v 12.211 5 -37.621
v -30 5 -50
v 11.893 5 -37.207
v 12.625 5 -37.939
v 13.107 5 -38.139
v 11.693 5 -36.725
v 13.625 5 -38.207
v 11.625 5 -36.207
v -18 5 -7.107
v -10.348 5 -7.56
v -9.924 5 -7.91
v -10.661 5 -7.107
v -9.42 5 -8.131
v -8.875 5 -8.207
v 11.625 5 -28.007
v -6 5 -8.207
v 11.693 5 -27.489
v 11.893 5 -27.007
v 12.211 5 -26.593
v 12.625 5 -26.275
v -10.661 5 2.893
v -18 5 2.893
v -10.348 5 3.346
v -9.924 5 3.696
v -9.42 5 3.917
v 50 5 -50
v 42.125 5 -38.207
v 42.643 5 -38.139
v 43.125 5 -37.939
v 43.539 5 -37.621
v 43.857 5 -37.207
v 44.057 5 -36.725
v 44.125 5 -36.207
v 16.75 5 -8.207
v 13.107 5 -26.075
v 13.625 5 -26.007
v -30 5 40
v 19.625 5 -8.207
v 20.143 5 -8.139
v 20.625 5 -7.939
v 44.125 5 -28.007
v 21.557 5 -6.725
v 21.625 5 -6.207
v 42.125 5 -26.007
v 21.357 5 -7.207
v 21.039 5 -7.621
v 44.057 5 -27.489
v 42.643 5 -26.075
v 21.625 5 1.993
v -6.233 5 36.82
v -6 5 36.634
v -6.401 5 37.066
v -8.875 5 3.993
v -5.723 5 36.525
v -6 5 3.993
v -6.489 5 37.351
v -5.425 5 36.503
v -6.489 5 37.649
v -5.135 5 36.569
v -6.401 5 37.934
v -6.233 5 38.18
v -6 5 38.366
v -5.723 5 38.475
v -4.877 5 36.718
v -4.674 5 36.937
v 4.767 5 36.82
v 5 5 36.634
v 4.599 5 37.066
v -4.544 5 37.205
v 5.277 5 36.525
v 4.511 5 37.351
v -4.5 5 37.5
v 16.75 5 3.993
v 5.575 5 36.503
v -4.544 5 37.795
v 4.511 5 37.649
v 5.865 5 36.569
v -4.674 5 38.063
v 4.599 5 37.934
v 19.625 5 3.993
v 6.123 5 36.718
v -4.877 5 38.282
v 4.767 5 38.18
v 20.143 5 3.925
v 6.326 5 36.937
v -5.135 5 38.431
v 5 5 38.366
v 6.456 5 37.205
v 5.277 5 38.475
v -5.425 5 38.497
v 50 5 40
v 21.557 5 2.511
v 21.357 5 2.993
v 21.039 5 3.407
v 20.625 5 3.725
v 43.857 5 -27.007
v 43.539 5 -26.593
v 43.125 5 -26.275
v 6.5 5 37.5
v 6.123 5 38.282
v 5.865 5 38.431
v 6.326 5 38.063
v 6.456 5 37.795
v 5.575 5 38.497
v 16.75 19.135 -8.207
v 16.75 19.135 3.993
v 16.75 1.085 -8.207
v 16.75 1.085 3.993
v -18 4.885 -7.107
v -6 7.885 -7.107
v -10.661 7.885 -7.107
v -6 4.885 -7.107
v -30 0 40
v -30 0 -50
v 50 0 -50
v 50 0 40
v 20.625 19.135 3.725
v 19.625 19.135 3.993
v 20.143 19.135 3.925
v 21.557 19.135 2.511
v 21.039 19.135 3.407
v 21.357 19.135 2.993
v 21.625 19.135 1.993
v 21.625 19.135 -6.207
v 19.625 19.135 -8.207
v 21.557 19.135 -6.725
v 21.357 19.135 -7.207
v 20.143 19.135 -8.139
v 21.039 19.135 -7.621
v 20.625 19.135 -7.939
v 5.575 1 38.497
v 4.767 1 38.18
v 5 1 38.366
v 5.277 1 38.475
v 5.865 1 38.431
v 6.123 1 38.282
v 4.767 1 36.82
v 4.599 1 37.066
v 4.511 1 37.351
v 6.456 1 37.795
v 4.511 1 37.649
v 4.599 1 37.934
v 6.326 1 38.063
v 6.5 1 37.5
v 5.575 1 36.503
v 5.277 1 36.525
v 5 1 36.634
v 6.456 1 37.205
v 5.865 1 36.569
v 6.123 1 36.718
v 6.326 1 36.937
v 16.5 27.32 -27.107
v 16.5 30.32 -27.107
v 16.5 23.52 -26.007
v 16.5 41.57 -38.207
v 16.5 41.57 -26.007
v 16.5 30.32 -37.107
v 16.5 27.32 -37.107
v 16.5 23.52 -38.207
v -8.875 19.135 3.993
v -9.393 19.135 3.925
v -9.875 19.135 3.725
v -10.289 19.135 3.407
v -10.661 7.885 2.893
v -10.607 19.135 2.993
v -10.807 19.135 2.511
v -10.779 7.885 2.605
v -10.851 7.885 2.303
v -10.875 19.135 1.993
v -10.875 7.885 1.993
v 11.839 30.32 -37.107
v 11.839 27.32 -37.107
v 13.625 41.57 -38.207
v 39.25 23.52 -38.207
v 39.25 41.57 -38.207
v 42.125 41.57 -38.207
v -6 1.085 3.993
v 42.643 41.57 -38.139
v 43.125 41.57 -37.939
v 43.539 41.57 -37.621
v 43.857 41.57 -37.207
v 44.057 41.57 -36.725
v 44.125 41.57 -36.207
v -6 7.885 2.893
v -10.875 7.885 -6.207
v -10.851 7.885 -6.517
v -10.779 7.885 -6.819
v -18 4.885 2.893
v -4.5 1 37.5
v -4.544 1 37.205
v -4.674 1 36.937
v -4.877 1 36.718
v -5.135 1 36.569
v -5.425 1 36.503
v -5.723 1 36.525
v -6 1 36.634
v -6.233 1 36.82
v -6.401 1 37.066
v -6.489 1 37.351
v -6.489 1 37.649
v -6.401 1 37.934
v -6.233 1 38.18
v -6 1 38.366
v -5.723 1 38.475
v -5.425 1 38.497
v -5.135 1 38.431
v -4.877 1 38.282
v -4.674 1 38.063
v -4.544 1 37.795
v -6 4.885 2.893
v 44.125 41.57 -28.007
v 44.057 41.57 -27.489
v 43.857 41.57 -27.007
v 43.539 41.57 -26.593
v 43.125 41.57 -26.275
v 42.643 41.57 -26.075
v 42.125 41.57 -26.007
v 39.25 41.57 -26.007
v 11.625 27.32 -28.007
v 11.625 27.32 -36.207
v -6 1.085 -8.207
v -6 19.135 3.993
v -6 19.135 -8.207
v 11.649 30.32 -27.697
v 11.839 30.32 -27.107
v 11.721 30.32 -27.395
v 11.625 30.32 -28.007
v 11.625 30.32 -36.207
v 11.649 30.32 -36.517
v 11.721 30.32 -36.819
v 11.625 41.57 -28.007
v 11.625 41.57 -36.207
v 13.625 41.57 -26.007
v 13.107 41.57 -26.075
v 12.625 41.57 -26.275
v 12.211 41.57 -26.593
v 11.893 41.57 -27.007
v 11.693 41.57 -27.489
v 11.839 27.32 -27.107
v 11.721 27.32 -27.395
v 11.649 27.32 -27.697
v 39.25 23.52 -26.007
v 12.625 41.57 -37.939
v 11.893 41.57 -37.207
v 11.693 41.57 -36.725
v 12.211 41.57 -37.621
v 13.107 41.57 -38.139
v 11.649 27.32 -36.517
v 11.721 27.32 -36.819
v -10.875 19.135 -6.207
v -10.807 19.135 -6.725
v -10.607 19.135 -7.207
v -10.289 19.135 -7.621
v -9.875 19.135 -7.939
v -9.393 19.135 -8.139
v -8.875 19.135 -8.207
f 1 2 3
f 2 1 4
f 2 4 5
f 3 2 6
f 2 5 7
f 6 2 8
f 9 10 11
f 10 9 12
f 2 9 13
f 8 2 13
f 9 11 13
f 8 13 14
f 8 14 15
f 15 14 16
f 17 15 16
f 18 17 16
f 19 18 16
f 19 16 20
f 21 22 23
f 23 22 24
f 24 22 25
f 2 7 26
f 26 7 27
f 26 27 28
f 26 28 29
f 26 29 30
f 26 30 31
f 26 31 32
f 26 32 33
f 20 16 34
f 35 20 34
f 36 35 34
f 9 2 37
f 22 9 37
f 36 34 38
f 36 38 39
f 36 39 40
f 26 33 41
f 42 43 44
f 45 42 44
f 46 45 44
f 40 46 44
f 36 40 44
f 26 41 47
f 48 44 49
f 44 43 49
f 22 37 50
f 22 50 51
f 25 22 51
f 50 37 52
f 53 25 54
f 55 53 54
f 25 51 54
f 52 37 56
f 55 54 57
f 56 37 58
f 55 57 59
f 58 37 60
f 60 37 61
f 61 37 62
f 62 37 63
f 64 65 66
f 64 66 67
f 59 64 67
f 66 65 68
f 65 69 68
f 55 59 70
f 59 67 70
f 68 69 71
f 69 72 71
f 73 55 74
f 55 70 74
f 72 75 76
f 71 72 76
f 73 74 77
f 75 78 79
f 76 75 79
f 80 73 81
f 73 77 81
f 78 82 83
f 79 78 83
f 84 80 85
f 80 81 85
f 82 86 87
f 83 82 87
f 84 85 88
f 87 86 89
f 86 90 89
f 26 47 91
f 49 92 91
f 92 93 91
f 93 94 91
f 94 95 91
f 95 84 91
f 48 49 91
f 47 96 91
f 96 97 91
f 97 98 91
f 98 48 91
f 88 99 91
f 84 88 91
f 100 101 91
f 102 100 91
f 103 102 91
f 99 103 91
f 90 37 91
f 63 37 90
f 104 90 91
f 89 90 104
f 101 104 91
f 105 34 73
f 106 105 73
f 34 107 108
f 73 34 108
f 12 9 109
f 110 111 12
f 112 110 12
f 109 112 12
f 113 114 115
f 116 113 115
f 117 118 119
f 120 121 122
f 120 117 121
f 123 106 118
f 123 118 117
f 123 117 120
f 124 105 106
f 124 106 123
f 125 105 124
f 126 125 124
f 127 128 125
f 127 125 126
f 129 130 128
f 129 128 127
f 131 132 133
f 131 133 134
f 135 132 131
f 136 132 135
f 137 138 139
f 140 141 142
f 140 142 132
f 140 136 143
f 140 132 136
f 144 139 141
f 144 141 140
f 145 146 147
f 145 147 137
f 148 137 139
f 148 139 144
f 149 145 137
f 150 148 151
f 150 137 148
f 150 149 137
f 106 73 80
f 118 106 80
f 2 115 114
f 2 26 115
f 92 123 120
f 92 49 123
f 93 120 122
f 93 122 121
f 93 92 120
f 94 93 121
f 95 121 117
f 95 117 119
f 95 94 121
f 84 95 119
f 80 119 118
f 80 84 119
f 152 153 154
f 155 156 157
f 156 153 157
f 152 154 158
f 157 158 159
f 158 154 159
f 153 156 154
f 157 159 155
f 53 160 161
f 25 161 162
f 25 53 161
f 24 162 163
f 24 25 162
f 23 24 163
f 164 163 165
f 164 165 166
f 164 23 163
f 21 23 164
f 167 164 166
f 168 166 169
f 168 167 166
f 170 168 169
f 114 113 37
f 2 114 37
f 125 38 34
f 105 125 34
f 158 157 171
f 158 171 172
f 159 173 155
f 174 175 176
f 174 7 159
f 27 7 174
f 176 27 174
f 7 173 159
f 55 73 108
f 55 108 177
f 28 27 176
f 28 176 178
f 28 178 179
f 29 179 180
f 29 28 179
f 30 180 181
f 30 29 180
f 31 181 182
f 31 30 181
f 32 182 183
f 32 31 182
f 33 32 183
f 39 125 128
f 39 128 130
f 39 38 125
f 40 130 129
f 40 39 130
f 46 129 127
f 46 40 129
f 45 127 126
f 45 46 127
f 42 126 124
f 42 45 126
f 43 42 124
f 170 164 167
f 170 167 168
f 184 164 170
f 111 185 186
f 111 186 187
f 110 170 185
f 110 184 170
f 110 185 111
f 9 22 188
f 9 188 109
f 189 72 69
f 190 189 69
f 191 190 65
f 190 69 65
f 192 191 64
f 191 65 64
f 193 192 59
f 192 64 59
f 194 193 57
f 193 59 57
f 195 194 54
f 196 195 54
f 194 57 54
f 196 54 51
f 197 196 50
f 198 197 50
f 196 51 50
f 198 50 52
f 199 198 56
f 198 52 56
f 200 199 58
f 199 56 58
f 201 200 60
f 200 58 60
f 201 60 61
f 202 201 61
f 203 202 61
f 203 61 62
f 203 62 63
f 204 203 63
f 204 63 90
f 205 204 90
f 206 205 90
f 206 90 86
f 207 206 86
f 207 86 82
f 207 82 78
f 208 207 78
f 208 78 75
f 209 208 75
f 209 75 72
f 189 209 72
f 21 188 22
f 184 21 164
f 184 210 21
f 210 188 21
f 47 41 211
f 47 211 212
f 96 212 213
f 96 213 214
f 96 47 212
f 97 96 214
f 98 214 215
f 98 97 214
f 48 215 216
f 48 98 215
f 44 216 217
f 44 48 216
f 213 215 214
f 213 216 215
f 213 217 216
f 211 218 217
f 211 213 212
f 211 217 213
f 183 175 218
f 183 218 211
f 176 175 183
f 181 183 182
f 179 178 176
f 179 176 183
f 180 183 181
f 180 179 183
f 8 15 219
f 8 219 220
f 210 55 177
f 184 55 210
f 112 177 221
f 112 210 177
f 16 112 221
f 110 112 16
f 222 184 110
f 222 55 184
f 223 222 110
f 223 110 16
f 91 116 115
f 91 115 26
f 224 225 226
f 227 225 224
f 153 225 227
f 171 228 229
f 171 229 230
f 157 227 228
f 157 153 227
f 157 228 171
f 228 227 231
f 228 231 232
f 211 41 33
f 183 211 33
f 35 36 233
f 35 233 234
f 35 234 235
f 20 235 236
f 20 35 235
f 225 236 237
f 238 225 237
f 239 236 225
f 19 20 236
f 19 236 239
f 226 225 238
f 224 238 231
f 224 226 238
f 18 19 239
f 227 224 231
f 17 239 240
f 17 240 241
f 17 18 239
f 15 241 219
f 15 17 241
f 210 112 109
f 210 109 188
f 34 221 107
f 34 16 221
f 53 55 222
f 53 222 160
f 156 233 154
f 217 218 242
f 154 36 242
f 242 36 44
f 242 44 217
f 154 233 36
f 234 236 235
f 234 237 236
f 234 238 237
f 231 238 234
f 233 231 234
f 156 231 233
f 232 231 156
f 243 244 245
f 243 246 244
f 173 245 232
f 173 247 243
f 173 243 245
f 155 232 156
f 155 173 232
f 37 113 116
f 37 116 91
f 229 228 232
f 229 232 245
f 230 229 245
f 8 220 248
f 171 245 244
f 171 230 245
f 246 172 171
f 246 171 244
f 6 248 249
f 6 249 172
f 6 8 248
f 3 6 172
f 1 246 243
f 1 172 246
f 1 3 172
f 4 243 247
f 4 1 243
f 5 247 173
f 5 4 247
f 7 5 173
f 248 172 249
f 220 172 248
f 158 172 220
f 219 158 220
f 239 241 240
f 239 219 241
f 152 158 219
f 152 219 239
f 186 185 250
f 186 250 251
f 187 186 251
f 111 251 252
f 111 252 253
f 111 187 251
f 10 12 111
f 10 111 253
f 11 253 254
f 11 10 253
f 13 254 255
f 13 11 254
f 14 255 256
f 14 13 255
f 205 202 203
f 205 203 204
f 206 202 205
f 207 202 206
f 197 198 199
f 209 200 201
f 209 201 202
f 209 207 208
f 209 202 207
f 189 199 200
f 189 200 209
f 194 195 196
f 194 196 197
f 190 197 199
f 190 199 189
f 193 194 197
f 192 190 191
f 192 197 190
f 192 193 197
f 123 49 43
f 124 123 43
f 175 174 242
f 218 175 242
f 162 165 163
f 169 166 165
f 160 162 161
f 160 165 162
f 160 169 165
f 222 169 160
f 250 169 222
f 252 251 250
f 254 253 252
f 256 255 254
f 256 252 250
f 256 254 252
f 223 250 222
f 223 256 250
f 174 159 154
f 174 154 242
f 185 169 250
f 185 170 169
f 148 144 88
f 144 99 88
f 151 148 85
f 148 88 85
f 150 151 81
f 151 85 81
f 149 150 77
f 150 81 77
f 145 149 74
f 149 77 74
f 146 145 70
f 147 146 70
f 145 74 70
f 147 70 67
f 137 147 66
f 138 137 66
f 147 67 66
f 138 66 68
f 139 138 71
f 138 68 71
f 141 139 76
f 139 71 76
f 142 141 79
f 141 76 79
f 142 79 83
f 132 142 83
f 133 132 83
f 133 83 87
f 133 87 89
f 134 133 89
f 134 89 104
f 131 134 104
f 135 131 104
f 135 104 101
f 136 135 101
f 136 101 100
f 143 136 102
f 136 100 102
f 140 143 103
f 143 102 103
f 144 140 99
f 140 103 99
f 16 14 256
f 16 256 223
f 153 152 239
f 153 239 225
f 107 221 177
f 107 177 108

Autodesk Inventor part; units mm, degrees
ref_plane "YZ Plane" through (0, 0, 0) normal (1, 0, 0) x (0, 1, 0)
ref_plane "XZ Plane" through (0, 0, 0) normal (0, 1, 0) x (-1, 0, 0)
ref_plane "XY Plane" through (0, 0, 0) normal (0, 0, 1) x (1, 0, 0)
sketch "Sketch1" plane through (0, 0, 0) normal (0, 1, 0) x (-1, 0, 0)
  line L0 (-30, -40) -> (-30, 40)
  line L1 (-30, 40) -> (30, 40)
  line L2 (30, 40) -> (30, -40)
  line L3 (30, -40) -> (-30, -40)
  line L4 (-30, -40) -> (30, 40) construction
  line L5 (-30, 40) -> (30, -40) construction
  point P0 (0, 0)
  dimension "d0" = 80
  dimension "d1" = 60
extrude "Extrusion1" add sketch "Sketch1" along normal blind 5
sketch "Sketch2" plane through (0, 5, 0) normal (0, 1, 0) x (1, 0, 0)
  circle A0 centre (-5.5, -37.5) radius 1
  circle A1 centre (5.5, -37.5) radius 1
  line L0 (-30, -40) -> (30, -40) projected
  line L1 (30, -40) -> (30, 40) projected
  point P0 (0, 0)
  dimension "d4" = 2
  dimension "d5" = 2
  dimension "d6" = 11
  dimension "d7" = 2.5
  dimension "d8" = 2.5
  dimension "d9" = 24.5
extrude "Extrusion2" cut sketch "Sketch2" against normal blind 4
sketch "Sketch3" plane through (0, 5, 0) normal (0, 1, 0) x (1, 0, 0)
  line L0 (30, -40) -> (30, 40) projected
  line L1 (30, -40) -> (0, -40)
  line L2 (-30, -40) -> (30, -40) projected
  line L3 (0, -40) -> (0, 2.107)
  line L4 (0, 2.107) -> (-6, 2.107)
  line L5 (-6, 2.107) -> (-6, 8.207)
  line L6 (-6, 8.207) -> (16.75, 8.207)
  line L7 (16.75, 8.207) -> (16.75, -3.993)
  line L8 (16.75, -3.993) -> (-6, -3.993)
  line L9 (-6, -3.993) -> (-6, 8.207)
  point P0 (0, 0)
  dimension "d12" = 42.107
  dimension "d13" = 6
  dimension "d14" = 6.1
  dimension "d15" = 22.75
  dimension "d16" = 12.2
extrude "Extrusion3" cut sketch "Sketch3" against normal blind 3.915
sketch "Sketch4" plane through (30, 0, 40) normal (1, 0, 0) x (0, 0, -1)
  line L0 (0, 0) -> (80, 0) projected
  line L1 (0, 5) -> (80, 5)
  line L2 (80, 5) -> (80, 0)
  line L3 (80, 0) -> (0, 0)
  line L4 (0, 0) -> (0, 5)
  point P0 (40, 0)
extrude "Extrusion4" add sketch "Sketch4" along normal blind 20
sketch "Sketch5" plane through (-30, 0, -40) normal (0, 0, -1) x (-1, 0, 0)
  line L0 (0, 5) -> (-80, 5) projected
  line L1 (0, 0) -> (0, 5) projected
  line L2 (-80, 5) -> (0, 5)
  line L3 (0, 5) -> (0, 0)
  line L4 (0, 0) -> (-80, 0)
  line L5 (-80, 0) -> (-80, 5)
  point P0 (-30, 0)
extrude "Extrusion5" add sketch "Sketch5" along normal blind 10
sketch "Sketch6" plane through (0, 5, 0) normal (0, 1, 0) x (1, 0, 0)
  line L0 (-30, -40) -> (-30, 50) projected
  line L1 (-30, -40) -> (0, -40)
  line L2 (-30, -40) -> (50, -40) projected
  line L3 (0, -40) -> (0, 32.107)
  line L4 (0, 32.107) -> (22.5, 32.107)
  line L5 (22.5, 32.107) -> (16.5, 32.107)
  line L6 (16.5, 32.107) -> (16.5, 38.207)
  line L7 (16.5, 38.207) -> (39.25, 38.207)
  line L8 (39.25, 38.207) -> (39.25, 26.007)
  line L9 (39.25, 26.007) -> (16.5, 26.007)
  line L10 (16.5, 26.007) -> (16.5, 38.207)
  point P0 (0, 0)
  dimension "d23" = 30
  dimension "d24" = 72.107
  dimension "d25" = 22.5
  dimension "d26" = 6
  dimension "d27" = 6.1
  dimension "d28" = 22.75
  dimension "d29" = 12.2
extrude "Extrusion6" add sketch "Sketch6" along normal blind 18.52
sketch "Sketch7" plane through (0, 5, 0) normal (0, 1, 0) x (1, 0, 0)
  line L0 (16.75, 8.207) -> (16.75, -3.993) projected
  line L1 (16.75, -3.993) -> (21.625, -3.993)
  line L2 (21.625, -3.993) -> (21.625, 8.207)
  line L3 (21.625, 8.207) -> (16.75, 8.207)
  line L4 (16.75, 8.207) -> (16.75, -3.993)
  line L5 (-6, -3.993) -> (-6, 8.207) projected
  line L6 (-6, -3.993) -> (-10.875, -3.993)
  line L7 (-10.875, -3.993) -> (-10.875, 8.207)
  line L8 (-10.875, 8.207) -> (-6, 8.207)
  line L9 (-6, 8.207) -> (-6, -3.993)
  point P0 (0, 0)
  dimension "d32" = 4.875
  dimension "d33" = 4.875
  dimension "d34" = 12.2
extrude "Extrusion7" add sketch "Sketch7" along normal blind 14.135
sketch "Sketch8" plane through (-6, 1.085, 3.993) normal (1, 0, 0) x (0, 0, -1)
  line L0 (0, 0) -> (12.2, 0) projected
  line L1 (6.1, 0) -> (6.1, 3.8)
  line L2 (6.1, 3.8) -> (11.1, 3.8)
  line L3 (11.1, 3.8) -> (1.1, 3.8)
  line L4 (1.1, 3.8) -> (1.1, 6.8)
  line L5 (1.1, 6.8) -> (11.1, 6.8)
  line L6 (11.1, 6.8) -> (11.1, 3.8)
  point P0 (3.993, -1.085)
  dimension "d37" = 3.8
  dimension "d38" = 5
  dimension "d39" = 10
  dimension "d40" = 3
extrude "Extrusion8" cut sketch "Sketch8" against normal blind 12
sketch "Sketch9" plane through (0, 5, 0) normal (0, 1, 0) x (1, 0, 0)
  line L0 (16.5, 26.007) -> (16.5, 38.207) projected
  line L1 (16.5, 26.007) -> (11.625, 26.007)
  line L2 (11.625, 26.007) -> (11.625, 38.207)
  line L3 (11.625, 38.207) -> (16.5, 38.207)
  line L4 (16.5, 38.207) -> (16.5, 26.007)
  line L5 (39.25, 26.007) -> (16.5, 26.007) projected
  line L6 (39.25, 26.007) -> (44.125, 26.007)
  line L7 (44.125, 26.007) -> (44.125, 38.207)
  line L8 (44.125, 38.207) -> (39.25, 38.207)
  line L9 (39.25, 38.207) -> (39.25, 26.007)
  point P0 (0, 0)
  dimension "d43" = 4.875
  dimension "d44" = 12.2
  dimension "d45" = 4.875
  dimension "d46" = 12.2
extrude "Extrusion9" add sketch "Sketch9" along normal blind 36.57
sketch "Sketch10" plane through (16.5, 23.52, -38.207) normal (1, 0, 0) x (0, 0, -1)
  line L0 (0, 0) -> (-12.2, 0) projected
  line L1 (-6.1, 0) -> (-6.1, 3.8)
  line L2 (-6.1, 3.8) -> (-1.1, 3.8)
  line L3 (-1.1, 3.8) -> (-11.1, 3.8)
  line L4 (-11.1, 3.8) -> (-11.1, 6.8)
  line L5 (-11.1, 6.8) -> (-1.1, 6.8)
  line L6 (-1.1, 6.8) -> (-1.1, 3.8)
  point P0 (-38.207, -23.52)
  point P1 (-6.1, 3.8)
  dimension "d49" = 3.8
  dimension "d50" = 5
  dimension "d51" = 10
  dimension "d52" = 3
extrude "Extrusion10" cut sketch "Sketch10" against normal up to surface (4.875 mm away)
fillet "Fillet1" radius 2 8 edges at (21.625, 12.0675, 3.993) (21.625, 12.0675, -8.207) (-10.875, 12.0675, 3.993) (-10.875, 12.0675, -8.207) (11.625, 23.285, -38.207) (11.625, 23.285, -26.007) (44.125, 23.285, -26.007) (44.125, 23.285, -38.207)
properties part number "Base"
